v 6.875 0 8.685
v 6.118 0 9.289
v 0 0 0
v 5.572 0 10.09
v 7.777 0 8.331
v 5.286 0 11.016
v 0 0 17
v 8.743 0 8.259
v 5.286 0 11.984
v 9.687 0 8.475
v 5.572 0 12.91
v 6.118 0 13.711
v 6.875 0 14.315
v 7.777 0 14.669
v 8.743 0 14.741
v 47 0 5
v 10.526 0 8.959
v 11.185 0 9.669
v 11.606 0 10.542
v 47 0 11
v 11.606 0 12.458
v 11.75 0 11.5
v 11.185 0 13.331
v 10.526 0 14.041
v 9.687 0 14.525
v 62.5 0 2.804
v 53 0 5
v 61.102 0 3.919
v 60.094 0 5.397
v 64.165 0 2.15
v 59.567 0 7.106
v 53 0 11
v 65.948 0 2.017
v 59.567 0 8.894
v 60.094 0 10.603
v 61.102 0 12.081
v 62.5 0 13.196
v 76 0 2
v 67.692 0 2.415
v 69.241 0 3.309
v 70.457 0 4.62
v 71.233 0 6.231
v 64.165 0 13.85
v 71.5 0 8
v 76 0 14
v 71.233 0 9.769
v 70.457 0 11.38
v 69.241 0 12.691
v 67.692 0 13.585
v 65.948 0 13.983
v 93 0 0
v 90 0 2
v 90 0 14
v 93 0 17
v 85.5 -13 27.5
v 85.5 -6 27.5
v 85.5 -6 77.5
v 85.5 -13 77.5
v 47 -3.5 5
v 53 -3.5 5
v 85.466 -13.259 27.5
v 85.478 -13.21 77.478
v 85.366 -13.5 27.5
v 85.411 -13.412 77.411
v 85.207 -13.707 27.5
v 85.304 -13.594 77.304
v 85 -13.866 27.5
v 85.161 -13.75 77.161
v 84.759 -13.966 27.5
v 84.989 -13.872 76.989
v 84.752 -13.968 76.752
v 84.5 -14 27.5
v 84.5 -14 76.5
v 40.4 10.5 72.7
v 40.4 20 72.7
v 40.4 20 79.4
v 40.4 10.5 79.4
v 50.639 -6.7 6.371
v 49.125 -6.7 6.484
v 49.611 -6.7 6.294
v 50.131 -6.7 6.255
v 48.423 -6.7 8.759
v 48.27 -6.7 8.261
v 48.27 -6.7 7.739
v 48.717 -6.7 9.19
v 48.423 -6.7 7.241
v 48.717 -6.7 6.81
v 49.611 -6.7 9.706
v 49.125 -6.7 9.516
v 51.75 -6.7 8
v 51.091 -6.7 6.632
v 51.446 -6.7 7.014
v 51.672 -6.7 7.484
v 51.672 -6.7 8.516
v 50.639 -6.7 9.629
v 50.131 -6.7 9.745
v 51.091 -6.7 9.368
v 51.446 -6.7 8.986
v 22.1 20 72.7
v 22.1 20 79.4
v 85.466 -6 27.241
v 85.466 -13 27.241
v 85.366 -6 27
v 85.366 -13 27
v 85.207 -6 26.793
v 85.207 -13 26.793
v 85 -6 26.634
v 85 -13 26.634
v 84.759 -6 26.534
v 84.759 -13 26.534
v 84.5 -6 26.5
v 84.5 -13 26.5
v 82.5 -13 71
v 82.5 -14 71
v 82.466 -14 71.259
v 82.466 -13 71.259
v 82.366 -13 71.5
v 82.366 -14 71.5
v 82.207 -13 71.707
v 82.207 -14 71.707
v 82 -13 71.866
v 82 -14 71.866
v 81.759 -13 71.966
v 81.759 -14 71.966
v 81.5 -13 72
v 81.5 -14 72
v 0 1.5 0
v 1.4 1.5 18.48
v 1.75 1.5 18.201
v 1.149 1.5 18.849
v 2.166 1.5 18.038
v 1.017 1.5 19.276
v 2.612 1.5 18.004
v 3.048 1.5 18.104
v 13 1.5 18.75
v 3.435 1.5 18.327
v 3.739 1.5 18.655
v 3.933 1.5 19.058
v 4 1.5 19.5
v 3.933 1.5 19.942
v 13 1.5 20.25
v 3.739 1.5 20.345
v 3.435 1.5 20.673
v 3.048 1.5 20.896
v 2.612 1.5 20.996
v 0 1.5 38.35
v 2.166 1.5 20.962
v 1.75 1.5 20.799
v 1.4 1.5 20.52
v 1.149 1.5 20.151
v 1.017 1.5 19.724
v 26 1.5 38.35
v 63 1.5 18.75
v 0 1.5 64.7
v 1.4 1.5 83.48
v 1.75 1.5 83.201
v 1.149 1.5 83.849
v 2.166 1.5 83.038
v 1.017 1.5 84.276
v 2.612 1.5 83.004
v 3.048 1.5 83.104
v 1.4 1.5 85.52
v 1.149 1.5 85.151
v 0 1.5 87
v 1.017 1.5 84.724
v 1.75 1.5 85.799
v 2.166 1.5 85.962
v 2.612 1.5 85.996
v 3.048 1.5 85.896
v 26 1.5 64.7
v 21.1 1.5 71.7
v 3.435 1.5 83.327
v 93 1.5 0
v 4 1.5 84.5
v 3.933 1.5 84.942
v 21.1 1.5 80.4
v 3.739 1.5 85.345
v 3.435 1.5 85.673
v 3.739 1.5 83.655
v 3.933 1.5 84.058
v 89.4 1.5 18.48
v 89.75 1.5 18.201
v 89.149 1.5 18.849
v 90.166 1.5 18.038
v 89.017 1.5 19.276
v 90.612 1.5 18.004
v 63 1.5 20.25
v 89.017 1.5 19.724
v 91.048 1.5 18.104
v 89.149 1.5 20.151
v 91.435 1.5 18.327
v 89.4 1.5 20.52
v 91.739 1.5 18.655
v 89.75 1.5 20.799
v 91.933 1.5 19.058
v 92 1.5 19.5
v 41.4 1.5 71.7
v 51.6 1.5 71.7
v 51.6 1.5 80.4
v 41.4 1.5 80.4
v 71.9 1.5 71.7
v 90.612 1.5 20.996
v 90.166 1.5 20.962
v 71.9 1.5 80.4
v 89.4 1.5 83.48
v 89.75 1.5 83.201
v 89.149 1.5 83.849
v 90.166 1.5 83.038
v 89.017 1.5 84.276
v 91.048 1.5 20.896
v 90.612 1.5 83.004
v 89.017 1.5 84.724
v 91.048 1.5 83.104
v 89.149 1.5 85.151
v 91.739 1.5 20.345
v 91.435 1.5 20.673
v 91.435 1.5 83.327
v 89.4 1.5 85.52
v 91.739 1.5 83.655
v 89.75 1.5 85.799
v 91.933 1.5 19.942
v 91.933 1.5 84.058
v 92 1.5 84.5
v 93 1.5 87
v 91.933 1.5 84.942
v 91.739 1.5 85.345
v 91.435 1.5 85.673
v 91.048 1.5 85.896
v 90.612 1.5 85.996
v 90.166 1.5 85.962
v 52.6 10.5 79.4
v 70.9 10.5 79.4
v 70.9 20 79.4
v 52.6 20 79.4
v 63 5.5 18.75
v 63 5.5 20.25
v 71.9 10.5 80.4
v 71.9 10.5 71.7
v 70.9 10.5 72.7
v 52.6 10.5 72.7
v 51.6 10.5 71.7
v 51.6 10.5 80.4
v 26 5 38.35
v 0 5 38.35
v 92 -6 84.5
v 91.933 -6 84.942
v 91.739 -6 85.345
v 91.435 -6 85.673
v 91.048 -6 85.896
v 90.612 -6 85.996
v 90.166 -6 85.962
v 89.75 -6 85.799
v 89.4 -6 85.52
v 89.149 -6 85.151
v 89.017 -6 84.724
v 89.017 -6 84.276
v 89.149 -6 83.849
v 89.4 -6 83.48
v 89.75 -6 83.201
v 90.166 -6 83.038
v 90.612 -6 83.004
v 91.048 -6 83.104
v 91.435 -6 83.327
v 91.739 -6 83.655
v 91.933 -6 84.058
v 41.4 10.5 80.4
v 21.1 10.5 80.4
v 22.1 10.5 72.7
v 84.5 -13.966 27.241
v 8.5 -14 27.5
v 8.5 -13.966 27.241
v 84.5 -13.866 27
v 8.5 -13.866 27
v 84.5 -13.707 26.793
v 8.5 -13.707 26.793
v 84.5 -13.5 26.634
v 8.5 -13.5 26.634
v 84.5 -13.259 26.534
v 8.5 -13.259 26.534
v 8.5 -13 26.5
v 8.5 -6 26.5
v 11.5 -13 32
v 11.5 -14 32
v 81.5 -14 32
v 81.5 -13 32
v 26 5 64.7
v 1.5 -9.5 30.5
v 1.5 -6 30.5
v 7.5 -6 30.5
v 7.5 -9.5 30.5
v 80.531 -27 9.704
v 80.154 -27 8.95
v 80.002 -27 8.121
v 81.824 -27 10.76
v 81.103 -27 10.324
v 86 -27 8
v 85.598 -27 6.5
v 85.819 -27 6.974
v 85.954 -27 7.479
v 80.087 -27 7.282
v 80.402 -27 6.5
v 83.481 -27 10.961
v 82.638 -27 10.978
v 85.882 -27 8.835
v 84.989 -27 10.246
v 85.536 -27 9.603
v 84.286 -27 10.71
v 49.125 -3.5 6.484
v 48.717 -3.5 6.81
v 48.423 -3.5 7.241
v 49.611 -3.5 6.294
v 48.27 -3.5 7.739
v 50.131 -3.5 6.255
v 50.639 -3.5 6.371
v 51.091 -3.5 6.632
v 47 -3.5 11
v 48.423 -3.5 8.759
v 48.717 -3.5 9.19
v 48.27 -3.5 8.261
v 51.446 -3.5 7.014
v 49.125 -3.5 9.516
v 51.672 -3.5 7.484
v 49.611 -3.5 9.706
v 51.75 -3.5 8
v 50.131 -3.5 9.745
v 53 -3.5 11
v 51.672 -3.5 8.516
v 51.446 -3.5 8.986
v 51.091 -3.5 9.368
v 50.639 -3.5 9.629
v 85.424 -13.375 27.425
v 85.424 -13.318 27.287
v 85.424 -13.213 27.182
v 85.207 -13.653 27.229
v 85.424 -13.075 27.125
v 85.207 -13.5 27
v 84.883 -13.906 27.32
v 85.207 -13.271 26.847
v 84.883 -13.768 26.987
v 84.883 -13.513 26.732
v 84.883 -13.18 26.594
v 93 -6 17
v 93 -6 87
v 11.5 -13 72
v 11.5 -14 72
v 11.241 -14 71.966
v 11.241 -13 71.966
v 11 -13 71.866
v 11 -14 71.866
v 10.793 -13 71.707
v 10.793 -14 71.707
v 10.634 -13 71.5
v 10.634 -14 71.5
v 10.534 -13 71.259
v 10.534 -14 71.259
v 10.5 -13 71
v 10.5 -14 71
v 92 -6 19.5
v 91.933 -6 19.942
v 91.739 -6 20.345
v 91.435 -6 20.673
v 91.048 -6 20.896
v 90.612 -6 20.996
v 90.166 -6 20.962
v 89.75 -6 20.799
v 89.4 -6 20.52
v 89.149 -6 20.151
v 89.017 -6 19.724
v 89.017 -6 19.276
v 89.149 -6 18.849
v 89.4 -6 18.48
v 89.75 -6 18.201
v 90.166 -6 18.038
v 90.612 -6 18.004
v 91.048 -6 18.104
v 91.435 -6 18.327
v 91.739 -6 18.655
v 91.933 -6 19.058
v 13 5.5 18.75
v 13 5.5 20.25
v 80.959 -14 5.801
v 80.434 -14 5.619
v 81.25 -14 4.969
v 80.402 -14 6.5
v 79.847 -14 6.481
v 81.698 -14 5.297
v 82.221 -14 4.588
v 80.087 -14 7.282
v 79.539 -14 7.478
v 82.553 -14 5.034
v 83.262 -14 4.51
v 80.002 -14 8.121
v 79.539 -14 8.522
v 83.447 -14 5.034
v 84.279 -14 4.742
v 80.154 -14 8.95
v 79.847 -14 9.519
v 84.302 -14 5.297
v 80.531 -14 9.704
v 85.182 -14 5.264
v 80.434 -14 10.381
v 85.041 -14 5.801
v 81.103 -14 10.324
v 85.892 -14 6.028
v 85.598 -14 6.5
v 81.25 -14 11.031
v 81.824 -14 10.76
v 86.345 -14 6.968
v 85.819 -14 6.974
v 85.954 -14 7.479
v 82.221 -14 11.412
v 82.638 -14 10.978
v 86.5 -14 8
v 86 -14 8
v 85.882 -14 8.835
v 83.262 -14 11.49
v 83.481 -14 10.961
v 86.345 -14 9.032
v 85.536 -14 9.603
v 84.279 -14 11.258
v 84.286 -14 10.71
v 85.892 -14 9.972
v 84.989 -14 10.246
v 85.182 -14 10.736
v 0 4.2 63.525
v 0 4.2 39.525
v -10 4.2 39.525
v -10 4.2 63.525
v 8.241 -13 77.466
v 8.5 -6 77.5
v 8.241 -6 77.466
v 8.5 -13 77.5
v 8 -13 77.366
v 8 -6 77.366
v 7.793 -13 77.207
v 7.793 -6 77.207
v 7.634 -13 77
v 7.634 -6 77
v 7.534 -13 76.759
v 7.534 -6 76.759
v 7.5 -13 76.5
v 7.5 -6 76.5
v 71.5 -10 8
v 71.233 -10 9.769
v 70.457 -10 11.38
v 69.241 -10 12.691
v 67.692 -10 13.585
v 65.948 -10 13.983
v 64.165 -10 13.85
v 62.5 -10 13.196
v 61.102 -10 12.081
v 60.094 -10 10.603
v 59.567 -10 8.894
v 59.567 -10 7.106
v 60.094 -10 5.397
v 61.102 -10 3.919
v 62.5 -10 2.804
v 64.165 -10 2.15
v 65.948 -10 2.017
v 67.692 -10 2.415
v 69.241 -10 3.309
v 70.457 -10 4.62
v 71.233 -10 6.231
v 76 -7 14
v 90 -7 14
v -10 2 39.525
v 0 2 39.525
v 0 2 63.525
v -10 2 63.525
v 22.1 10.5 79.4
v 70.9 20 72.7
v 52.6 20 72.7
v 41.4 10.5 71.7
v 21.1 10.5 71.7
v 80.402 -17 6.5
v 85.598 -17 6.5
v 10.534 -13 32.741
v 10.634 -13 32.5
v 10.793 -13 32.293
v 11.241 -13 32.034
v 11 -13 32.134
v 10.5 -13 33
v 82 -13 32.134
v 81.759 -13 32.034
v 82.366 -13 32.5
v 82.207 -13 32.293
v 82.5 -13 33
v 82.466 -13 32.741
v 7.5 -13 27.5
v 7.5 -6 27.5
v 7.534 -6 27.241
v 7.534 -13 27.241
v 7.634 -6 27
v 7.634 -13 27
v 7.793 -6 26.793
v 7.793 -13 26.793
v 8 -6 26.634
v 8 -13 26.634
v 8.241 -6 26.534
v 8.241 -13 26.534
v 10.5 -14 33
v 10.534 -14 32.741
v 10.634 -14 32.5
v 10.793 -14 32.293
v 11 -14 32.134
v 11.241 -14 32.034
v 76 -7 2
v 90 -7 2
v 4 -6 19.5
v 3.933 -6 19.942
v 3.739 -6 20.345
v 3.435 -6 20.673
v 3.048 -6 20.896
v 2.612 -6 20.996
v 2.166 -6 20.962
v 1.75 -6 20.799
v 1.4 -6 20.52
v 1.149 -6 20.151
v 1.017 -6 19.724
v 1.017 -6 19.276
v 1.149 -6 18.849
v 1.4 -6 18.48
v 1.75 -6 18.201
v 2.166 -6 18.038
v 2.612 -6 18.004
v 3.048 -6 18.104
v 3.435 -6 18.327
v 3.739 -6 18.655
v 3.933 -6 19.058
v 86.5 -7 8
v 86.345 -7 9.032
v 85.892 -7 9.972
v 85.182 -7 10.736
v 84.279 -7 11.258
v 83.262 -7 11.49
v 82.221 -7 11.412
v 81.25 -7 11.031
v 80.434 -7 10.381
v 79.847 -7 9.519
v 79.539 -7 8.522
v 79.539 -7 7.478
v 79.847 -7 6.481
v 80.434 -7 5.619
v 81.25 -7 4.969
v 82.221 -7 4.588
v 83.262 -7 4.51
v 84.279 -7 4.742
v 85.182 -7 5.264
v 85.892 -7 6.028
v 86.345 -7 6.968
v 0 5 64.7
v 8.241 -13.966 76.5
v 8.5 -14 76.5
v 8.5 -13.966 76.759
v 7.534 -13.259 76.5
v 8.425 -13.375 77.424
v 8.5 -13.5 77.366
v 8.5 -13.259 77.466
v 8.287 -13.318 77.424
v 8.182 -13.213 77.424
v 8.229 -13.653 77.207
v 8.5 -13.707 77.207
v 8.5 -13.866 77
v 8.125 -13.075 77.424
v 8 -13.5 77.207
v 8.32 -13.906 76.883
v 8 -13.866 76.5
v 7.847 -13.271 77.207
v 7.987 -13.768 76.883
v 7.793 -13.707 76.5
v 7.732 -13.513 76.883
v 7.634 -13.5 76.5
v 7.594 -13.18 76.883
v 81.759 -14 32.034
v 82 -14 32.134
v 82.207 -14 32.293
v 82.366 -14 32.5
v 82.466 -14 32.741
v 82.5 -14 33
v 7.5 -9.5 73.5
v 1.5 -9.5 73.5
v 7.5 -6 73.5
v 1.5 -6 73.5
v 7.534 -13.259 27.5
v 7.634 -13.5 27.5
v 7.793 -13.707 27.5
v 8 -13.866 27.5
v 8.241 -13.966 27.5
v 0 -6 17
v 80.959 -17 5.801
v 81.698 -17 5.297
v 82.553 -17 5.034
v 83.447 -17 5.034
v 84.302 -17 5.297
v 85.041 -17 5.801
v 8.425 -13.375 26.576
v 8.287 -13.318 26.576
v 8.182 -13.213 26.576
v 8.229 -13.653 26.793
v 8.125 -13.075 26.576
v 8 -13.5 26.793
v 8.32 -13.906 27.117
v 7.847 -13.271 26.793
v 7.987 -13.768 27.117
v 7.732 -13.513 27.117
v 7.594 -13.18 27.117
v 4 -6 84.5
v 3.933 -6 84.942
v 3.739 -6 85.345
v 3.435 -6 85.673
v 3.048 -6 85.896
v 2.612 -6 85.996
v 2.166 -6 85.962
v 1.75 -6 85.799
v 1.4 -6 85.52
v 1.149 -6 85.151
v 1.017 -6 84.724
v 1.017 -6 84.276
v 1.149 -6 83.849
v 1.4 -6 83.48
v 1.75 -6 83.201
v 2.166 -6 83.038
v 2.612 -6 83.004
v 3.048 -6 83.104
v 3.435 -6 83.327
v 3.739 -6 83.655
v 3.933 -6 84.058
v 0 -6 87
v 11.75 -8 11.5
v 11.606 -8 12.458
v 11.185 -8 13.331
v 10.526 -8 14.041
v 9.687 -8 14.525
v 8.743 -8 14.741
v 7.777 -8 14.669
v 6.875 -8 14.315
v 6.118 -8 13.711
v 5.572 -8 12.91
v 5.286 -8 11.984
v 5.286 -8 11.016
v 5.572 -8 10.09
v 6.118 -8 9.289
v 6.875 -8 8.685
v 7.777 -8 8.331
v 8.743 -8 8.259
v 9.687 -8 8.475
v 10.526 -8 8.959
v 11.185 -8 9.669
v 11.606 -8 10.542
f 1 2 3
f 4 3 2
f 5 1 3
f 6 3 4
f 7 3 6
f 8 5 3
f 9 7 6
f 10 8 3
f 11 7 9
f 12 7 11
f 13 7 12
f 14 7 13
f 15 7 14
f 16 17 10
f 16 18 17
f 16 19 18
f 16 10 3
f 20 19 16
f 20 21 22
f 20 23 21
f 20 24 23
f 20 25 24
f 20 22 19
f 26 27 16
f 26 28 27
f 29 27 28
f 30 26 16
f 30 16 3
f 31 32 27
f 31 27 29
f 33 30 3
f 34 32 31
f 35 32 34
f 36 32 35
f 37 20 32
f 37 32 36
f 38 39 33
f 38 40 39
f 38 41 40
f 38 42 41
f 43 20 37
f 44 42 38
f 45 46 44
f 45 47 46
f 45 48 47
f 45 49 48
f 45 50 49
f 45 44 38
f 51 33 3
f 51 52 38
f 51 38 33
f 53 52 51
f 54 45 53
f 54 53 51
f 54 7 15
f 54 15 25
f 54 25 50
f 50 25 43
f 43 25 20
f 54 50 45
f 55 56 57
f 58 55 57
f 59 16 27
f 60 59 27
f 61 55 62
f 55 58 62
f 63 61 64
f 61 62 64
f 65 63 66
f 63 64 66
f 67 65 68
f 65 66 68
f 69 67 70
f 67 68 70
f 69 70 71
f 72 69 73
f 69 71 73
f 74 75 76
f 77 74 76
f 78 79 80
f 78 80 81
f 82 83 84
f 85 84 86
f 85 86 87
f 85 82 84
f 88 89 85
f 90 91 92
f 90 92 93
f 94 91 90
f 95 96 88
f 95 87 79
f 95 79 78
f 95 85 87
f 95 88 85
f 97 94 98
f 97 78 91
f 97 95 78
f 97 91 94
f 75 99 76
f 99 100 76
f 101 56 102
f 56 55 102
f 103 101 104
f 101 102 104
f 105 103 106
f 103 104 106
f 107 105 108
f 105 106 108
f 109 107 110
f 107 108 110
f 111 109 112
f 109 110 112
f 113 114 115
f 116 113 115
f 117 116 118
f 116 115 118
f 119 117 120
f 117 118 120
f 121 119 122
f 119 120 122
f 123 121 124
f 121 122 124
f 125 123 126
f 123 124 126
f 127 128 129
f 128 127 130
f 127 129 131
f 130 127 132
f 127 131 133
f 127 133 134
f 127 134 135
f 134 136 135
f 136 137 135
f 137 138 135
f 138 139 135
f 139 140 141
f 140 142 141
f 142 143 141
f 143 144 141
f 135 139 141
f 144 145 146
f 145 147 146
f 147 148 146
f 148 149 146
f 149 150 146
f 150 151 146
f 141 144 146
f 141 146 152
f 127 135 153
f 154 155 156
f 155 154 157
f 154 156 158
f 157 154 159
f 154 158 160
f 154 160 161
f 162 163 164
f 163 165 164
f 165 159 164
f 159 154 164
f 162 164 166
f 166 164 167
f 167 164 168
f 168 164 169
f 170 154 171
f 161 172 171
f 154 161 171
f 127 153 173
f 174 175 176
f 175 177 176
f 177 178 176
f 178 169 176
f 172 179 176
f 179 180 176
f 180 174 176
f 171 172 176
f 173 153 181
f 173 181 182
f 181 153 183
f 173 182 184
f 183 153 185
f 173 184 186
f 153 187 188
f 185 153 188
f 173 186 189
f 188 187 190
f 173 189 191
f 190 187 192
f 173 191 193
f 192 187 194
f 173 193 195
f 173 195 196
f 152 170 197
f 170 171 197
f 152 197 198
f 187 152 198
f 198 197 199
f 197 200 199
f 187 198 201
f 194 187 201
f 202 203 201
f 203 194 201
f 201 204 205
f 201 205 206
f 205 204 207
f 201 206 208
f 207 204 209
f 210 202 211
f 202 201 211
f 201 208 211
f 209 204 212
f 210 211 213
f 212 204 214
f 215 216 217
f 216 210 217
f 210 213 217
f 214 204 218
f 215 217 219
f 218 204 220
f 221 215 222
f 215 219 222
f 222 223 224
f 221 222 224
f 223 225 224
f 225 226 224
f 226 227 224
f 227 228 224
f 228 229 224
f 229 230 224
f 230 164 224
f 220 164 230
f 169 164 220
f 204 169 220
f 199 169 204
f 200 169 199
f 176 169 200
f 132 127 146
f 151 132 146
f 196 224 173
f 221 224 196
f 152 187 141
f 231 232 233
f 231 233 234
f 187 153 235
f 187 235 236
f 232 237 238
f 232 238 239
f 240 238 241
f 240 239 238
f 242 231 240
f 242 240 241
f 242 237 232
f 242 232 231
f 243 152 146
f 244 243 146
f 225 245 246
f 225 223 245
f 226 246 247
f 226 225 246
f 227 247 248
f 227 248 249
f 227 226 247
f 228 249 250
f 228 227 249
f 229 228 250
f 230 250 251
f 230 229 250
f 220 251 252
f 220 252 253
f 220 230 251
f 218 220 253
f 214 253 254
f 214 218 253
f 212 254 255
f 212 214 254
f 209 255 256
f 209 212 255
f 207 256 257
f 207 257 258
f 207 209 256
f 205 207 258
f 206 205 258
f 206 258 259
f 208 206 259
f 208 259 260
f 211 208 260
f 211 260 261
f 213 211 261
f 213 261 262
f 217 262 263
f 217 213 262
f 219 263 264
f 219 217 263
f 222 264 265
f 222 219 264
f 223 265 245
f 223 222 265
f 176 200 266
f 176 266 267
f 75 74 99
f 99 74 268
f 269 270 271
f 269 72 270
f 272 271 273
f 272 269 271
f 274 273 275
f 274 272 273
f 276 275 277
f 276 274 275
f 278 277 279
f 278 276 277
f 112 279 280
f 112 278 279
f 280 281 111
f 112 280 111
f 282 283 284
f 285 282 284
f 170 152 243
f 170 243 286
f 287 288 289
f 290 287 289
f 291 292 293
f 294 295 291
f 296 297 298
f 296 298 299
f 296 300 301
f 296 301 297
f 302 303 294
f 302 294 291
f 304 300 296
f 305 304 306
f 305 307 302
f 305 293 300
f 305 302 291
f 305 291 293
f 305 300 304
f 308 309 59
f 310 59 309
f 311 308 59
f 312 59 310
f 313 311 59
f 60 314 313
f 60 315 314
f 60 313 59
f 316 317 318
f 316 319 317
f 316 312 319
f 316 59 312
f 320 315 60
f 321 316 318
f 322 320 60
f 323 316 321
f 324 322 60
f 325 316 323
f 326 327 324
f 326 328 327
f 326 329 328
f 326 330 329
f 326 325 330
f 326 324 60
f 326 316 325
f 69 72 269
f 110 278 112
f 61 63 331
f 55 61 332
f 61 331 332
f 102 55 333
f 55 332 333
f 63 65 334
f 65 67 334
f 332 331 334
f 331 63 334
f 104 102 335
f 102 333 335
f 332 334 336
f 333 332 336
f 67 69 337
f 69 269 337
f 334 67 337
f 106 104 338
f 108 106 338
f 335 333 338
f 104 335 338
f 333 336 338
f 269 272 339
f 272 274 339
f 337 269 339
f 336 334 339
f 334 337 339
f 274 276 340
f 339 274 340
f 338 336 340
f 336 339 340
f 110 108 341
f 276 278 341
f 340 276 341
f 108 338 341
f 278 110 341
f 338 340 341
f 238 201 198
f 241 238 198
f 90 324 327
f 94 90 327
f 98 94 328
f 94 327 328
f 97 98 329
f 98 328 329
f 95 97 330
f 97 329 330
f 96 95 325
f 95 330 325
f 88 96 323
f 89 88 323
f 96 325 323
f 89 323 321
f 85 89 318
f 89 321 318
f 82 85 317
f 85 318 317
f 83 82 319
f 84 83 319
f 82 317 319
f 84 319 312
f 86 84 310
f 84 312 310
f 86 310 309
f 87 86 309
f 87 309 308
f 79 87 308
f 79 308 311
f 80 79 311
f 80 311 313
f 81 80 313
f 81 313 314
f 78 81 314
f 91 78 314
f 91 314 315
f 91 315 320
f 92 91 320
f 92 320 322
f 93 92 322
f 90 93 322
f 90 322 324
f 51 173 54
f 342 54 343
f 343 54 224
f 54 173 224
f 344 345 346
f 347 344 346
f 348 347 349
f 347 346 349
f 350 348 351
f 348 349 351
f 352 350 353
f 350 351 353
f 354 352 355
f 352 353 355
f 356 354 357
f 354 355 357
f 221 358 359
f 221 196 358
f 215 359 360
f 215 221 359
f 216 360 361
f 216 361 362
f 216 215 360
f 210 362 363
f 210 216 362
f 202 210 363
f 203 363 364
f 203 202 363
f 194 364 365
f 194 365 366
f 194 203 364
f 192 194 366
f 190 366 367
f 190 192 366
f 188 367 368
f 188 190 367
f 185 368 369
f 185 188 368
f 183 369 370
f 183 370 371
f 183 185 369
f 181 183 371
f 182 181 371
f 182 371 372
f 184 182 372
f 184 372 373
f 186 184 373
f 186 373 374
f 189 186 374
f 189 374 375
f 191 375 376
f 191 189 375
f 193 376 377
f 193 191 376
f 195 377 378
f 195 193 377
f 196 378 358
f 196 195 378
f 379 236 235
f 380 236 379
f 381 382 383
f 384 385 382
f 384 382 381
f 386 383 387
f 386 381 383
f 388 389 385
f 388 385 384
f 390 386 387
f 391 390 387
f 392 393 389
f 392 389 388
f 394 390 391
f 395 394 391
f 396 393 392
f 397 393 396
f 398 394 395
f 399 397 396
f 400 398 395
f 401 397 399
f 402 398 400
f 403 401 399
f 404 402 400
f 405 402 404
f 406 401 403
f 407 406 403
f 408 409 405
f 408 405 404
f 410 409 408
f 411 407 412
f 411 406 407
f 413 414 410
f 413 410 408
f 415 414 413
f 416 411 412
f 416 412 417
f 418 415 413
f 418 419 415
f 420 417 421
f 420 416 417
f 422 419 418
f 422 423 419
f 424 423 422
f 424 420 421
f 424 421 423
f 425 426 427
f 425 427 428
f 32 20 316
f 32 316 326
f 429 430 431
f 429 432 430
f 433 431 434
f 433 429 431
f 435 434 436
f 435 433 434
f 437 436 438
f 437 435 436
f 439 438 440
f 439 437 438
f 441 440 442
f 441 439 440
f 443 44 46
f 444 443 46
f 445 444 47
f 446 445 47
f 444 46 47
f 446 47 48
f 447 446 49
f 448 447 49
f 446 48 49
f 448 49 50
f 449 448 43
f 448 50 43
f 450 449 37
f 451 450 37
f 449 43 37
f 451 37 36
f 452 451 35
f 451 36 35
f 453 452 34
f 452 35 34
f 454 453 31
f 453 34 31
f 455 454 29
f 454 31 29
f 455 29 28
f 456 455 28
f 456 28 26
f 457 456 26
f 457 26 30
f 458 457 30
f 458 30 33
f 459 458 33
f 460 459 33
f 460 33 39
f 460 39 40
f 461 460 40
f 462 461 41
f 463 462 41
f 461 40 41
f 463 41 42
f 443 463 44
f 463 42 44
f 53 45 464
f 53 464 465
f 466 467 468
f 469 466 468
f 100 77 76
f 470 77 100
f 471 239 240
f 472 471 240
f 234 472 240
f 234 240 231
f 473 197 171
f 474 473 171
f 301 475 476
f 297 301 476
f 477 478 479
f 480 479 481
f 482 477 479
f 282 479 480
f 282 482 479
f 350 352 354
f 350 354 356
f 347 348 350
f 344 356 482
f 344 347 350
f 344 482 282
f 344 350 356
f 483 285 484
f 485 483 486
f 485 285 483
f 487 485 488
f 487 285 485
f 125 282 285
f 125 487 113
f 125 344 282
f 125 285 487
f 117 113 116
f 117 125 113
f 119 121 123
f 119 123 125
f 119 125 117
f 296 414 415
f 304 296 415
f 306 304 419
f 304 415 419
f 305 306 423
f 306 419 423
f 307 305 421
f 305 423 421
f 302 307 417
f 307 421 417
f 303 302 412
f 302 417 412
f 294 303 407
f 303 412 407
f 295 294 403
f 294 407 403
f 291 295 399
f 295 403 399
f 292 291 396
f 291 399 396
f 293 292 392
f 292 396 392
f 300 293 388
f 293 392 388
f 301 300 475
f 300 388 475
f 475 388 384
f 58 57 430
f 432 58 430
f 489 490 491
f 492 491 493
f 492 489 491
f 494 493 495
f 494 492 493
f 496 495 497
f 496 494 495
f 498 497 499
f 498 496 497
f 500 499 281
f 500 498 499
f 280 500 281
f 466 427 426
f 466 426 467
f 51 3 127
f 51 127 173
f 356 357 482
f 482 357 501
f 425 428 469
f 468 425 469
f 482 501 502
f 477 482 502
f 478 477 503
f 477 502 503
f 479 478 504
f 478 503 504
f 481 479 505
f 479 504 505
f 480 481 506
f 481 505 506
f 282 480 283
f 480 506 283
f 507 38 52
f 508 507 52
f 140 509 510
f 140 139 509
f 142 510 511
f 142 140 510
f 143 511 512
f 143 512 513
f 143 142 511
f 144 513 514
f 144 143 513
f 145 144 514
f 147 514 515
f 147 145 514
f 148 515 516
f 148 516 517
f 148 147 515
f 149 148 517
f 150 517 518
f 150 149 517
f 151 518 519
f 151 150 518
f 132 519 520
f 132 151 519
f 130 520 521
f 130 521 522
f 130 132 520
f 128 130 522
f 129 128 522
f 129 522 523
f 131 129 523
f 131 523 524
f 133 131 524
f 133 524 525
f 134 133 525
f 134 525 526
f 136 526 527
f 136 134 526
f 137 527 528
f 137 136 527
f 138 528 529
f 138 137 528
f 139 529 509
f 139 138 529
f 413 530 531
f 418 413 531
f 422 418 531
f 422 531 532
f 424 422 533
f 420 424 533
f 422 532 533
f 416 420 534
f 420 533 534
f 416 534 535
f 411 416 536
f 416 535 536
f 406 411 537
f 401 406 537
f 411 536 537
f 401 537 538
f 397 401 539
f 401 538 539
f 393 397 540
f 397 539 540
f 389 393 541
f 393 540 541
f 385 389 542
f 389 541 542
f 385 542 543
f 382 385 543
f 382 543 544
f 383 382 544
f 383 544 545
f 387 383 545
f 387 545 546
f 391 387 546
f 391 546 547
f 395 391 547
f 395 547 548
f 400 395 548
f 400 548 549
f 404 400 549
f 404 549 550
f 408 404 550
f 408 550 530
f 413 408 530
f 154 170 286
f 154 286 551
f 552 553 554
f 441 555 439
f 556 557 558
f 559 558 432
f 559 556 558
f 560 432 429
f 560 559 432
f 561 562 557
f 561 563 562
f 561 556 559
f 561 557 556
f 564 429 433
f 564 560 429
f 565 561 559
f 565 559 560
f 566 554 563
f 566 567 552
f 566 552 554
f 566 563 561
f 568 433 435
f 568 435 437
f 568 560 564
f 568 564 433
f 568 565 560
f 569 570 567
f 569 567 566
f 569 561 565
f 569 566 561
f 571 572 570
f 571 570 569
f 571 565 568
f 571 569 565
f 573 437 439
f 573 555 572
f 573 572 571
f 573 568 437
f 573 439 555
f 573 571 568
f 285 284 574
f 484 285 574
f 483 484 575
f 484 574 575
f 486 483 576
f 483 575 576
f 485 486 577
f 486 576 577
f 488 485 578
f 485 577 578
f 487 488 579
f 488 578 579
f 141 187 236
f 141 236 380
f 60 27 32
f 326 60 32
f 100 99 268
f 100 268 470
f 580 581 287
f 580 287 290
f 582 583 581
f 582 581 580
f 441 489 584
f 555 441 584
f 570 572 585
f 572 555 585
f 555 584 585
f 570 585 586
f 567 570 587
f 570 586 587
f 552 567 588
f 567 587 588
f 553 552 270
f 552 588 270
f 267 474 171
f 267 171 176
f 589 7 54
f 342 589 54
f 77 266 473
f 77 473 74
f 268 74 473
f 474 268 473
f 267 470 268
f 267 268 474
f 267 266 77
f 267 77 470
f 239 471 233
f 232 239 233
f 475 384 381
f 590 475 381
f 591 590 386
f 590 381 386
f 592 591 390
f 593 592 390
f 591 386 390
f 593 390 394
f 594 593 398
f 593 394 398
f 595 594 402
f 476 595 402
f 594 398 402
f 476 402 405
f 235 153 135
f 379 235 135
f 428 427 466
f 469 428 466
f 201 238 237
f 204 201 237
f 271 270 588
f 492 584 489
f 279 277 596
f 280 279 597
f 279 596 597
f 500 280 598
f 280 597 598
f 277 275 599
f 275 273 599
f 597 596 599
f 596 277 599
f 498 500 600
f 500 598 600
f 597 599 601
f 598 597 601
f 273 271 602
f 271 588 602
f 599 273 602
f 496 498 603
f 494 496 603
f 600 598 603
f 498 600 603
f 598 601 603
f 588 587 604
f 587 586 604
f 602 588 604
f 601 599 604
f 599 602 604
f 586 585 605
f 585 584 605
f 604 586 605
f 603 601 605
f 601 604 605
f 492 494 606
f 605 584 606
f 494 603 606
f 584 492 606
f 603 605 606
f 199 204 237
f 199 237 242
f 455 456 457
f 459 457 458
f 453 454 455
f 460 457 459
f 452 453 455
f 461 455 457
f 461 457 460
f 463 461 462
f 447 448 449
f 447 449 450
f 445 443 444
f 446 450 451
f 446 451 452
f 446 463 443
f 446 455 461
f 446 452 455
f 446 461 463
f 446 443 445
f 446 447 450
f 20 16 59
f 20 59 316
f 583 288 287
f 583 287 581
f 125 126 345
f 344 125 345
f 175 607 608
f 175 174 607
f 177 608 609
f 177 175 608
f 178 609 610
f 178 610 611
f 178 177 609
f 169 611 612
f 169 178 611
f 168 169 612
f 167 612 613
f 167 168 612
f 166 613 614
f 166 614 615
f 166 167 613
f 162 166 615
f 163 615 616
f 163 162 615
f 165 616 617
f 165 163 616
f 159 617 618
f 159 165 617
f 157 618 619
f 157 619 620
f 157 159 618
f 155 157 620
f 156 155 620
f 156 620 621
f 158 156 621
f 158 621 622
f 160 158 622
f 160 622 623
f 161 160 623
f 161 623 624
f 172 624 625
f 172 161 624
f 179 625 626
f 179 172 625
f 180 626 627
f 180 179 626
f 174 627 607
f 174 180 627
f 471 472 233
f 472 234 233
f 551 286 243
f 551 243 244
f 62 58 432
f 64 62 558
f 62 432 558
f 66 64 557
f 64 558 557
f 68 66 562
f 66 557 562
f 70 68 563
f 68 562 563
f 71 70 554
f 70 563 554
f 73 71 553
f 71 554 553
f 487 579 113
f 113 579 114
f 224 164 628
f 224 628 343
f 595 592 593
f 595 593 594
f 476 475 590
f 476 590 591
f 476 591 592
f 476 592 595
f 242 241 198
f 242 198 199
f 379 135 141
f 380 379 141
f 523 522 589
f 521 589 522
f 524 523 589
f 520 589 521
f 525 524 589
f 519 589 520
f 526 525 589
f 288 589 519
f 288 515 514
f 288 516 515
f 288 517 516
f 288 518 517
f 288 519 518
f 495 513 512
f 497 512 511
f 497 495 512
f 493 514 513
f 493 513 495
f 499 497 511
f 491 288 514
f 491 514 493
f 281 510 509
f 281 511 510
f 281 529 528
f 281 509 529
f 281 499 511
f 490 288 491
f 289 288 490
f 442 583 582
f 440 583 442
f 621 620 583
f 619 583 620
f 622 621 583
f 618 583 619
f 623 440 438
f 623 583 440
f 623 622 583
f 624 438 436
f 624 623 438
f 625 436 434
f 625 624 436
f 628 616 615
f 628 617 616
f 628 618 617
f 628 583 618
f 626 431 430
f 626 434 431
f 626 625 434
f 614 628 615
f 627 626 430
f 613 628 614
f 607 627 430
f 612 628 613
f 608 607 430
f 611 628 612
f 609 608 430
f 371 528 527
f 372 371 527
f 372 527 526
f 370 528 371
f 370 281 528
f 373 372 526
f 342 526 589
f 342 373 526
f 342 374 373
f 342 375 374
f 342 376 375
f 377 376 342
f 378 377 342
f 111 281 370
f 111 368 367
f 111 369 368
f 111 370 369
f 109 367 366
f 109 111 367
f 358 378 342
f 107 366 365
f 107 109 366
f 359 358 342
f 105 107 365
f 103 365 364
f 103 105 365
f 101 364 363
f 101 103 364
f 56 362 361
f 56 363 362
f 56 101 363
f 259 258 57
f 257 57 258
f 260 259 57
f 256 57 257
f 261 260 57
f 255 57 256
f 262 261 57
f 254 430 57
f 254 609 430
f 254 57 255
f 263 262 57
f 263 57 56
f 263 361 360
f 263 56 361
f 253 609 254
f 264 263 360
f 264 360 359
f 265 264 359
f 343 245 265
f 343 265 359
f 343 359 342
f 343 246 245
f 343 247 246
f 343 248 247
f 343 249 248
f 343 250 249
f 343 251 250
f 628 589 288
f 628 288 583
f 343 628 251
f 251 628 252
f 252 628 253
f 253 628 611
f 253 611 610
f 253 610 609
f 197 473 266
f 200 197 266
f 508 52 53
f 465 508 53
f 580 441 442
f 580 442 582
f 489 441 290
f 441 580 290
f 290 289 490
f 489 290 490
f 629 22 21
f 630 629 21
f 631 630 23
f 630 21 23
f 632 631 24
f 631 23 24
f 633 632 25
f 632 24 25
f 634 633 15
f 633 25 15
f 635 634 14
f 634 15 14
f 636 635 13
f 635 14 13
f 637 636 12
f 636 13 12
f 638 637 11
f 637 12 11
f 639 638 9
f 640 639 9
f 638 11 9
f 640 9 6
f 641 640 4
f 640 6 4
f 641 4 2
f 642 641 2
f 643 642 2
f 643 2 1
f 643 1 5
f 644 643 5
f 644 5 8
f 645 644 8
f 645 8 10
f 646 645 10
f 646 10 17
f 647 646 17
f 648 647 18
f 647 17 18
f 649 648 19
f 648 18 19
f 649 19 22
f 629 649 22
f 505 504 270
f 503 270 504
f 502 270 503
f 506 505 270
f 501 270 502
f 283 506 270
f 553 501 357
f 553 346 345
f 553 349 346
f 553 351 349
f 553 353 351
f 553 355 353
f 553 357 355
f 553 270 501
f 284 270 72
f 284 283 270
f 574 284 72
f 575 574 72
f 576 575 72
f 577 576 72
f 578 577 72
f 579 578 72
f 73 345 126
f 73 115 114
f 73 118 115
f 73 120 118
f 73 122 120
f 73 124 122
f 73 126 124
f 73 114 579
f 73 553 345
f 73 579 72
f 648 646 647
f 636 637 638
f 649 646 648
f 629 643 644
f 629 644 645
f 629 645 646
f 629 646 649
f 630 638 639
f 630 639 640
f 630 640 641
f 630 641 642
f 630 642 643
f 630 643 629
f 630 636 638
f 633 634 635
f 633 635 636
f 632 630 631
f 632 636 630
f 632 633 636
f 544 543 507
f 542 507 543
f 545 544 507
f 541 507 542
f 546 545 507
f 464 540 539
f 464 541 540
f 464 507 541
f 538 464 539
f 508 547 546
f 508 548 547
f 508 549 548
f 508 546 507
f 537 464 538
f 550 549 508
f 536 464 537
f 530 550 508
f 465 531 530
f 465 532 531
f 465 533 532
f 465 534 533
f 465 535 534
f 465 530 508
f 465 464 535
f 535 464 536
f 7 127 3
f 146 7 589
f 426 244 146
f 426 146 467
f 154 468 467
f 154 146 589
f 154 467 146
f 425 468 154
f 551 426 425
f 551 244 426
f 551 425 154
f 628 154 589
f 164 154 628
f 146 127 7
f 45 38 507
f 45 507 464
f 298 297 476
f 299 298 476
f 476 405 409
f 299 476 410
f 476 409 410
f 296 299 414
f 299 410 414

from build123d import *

# Parameters (mm, degrees)
F0_W      = 93
F0_H      = 70
F0_R      = 1.5
F0_H_2    = 17
F0_R_2    = 3.25
F0_W_2    = 6
F0_H_3    = 6
F0_R_3    = 6
F0_W_3    = 14
F0_H_4    = 12
F0_R_4    = 3.5
F0_R_5    = 1.75
F1_DEPTH  = 1.5
F2_W      = 20.3
F2_H      = 8.7
F2_W_2    = 18.3
F2_H_2    = 6.7
F3_DEPTH  = 9
F2_W_3    = 26
F2_H_3    = 26.35
F4_DEPTH  = 3.5
F5_DEPTH  = 18.5
F6_DEPTH  = 6
F2_W_4    = 50
F2_H_4    = 1.5
F7_DEPTH  = 4
F8_DEPTH  = 10
F9_DEPTH  = 3.5
F10_DEPTH = 6.7
F11_DEPTH = 27
F12_DEPTH = 17
F13_DEPTH = 14
F14_DEPTH = 7
F15_DEPTH = 8
F16_W     = 6
F16_H     = 43
F17_DEPTH = 3.5
F18_DEPTH = 8
F19_R     = 1
F21_DEPTH = 1
F22_W     = 2.2
F22_H     = 24
F23_DEPTH = 10


with BuildPart() as f1:
    # F0 (on Front) → F1 (new body)
    with BuildSketch(Plane.XZ):
        with Locations((46.5, 52)):
            Rectangle(F0_W, F0_H)
        with Locations((2.5, 19.5)):
            Circle(F0_R, mode=Mode.SUBTRACT)
        with Locations((90.5, 19.5)):
            Circle(F0_R, mode=Mode.SUBTRACT)
        with Locations((2.5, 84.5)):
            Circle(F0_R, mode=Mode.SUBTRACT)
        with Locations((90.5, 84.5)):
            Circle(F0_R, mode=Mode.SUBTRACT)
        with Locations((46.5, 8.5)):
            Rectangle(F0_W, F0_H_2)
        with Locations((8.5, 11.5)):
            Circle(F0_R_2, mode=Mode.SUBTRACT)
        with Locations((50, 8)):
            Rectangle(F0_W_2, F0_H_3, mode=Mode.SUBTRACT)
        with Locations((65.5, 8)):
            Circle(F0_R_3, mode=Mode.SUBTRACT)
        with Locations((83, 8)):
            Rectangle(F0_W_3, F0_H_4, mode=Mode.SUBTRACT)
        with Locations((83, 8)):
            Rectangle(F0_W_3, F0_H_4)
        with Locations((83, 8)):
            Circle(F0_R_4, mode=Mode.SUBTRACT)
        with Locations((65.5, 8)):
            Circle(F0_R_3)
        with Locations((83, 8)):
            Circle(F0_R_4)
        with BuildLine():
            ThreePointArc((80.4019237886, 6.5), (82.2235428647, 10.8977774789), (86, 8))
            ThreePointArc((86, 8), (85.8977774789, 7.2235428647), (85.5980762114, 6.5))
            ThreePointArc((85.5980762114, 6.5), (83, 5), (80.4019237886, 6.5))
        make_face(mode=Mode.SUBTRACT)
        with Locations((50, 8)):
            Rectangle(F0_W_2, F0_H_3)
        with Locations((50, 8)):
            Circle(F0_R_5, mode=Mode.SUBTRACT)
        with Locations((8.5, 11.5)):
            Circle(F0_R_2)
        with BuildLine():
            ThreePointArc((85.5980762114, 6.5), (85.8977774789, 7.2235428647), (86, 8))
            ThreePointArc((86, 8), (82.2235428647, 10.8977774789), (80.4019237886, 6.5))
            Line((80.4019237886, 6.5), (85.5980762114, 6.5))
        make_face()
        with Locations((50, 8)):
            Circle(F0_R_5)
        with BuildLine():
            Line((85.5980762114, 6.5), (80.4019237886, 6.5))
            ThreePointArc((80.4019237886, 6.5), (83, 5), (85.5980762114, 6.5))
        make_face()
    extrude(amount=-F1_DEPTH)

    # F2 (on face) → F3 (join)
    with BuildSketch(Plane(origin=(0, 1.5, 0), x_dir=(-1, 0, 0), z_dir=(0, 1, 0))):
        with Locations((-61.75, 76.05)):
            Rectangle(F2_W, F2_H)
        with Locations((-61.75, 76.05)):
            Rectangle(F2_W_2, F2_H_2, mode=Mode.SUBTRACT)
        with Locations((-31.25, 76.05)):
            Rectangle(F2_W, F2_H)
        with Locations((-31.25, 76.05)):
            Rectangle(F2_W_2, F2_H_2, mode=Mode.SUBTRACT)
    extrude(amount=F3_DEPTH)

    # F2 (on face) → F4 (join)
    with BuildSketch(Plane(origin=(0, 1.5, 0), x_dir=(-1, 0, 0), z_dir=(0, 1, 0))):
        with Locations((-13, 51.525)):
            Rectangle(F2_W_3, F2_H_3)
    extrude(amount=F4_DEPTH)

    # F5 (add): faces of the model
    f5_faces = [f1.faces().sort_by_distance(p)[0] for p in [
        (61.75, 1.5, 76.05),
        (31.25, 1.5, 76.05),
    ]]
    extrude(f5_faces, amount=F5_DEPTH)

    # F0 (on Front) → F6 (join)
    with BuildSketch(Plane.XZ):
        with Locations((46.5, 52)):
            Rectangle(F0_W, F0_H)
        with Locations((2.5, 19.5)):
            Circle(F0_R, mode=Mode.SUBTRACT)
        with Locations((90.5, 19.5)):
            Circle(F0_R, mode=Mode.SUBTRACT)
        with Locations((2.5, 84.5)):
            Circle(F0_R, mode=Mode.SUBTRACT)
        with Locations((90.5, 84.5)):
            Circle(F0_R, mode=Mode.SUBTRACT)
    extrude(amount=F6_DEPTH)

    # F2 (on face) → F7 (join)
    with BuildSketch(Plane(origin=(0, 1.5, 0), x_dir=(-1, 0, 0), z_dir=(0, 1, 0))):
        with Locations((-38, 19.5)):
            Rectangle(F2_W_4, F2_H_4)
    extrude(amount=F7_DEPTH)

    # F0 (on Front) → F8 (join)
    with BuildSketch(Plane.XZ):
        with Locations((65.5, 8)):
            Circle(F0_R_3)
    extrude(amount=F8_DEPTH)

    # F0 (on Front) → F9 (join)
    with BuildSketch(Plane.XZ):
        with Locations((50, 8)):
            Rectangle(F0_W_2, F0_H_3)
        with Locations((50, 8)):
            Circle(F0_R_5, mode=Mode.SUBTRACT)
    extrude(amount=F9_DEPTH)

    # F0 (on Front) → F10 (join)
    with BuildSketch(Plane.XZ):
        with Locations((50, 8)):
            Circle(F0_R_5)
    extrude(amount=F10_DEPTH)

    # F0 (on Front) → F11 (join)
    with BuildSketch(Plane.XZ):
        with BuildLine():
            ThreePointArc((85.5980762114, 6.5), (85.8977774789, 7.2235428647), (86, 8))
            ThreePointArc((86, 8), (82.2235428647, 10.8977774789), (80.4019237886, 6.5))
            Line((80.4019237886, 6.5), (85.5980762114, 6.5))
        make_face()
    extrude(amount=F11_DEPTH)

    # F0 (on Front) → F12 (join)
    with BuildSketch(Plane.XZ):
        with BuildLine():
            Line((85.5980762114, 6.5), (80.4019237886, 6.5))
            ThreePointArc((80.4019237886, 6.5), (83, 5), (85.5980762114, 6.5))
        make_face()
    extrude(amount=F12_DEPTH)

    # F0 (on Front) → F13 (join)
    with BuildSketch(Plane.XZ):
        with Locations((83, 8)):
            Circle(F0_R_4)
        with BuildLine():
            ThreePointArc((80.4019237886, 6.5), (82.2235428647, 10.8977774789), (86, 8))
            ThreePointArc((86, 8), (85.8977774789, 7.2235428647), (85.5980762114, 6.5))
            ThreePointArc((85.5980762114, 6.5), (83, 5), (80.4019237886, 6.5))
        make_face(mode=Mode.SUBTRACT)
        with BuildLine():
            Line((85.5980762114, 6.5), (80.4019237886, 6.5))
            ThreePointArc((80.4019237886, 6.5), (83, 5), (85.5980762114, 6.5))
        make_face()
        with BuildLine():
            ThreePointArc((85.5980762114, 6.5), (85.8977774789, 7.2235428647), (86, 8))
            ThreePointArc((86, 8), (82.2235428647, 10.8977774789), (80.4019237886, 6.5))
            Line((80.4019237886, 6.5), (85.5980762114, 6.5))
        make_face()
    extrude(amount=F13_DEPTH)

    # F0 (on Front) → F14 (join)
    with BuildSketch(Plane.XZ):
        with Locations((83, 8)):
            Rectangle(F0_W_3, F0_H_4)
        with Locations((83, 8)):
            Circle(F0_R_4, mode=Mode.SUBTRACT)
    extrude(amount=F14_DEPTH)

    # F0 (on Front) → F15 (join)
    with BuildSketch(Plane.XZ):
        with Locations((8.5, 11.5)):
            Circle(F0_R_2)
    extrude(amount=F15_DEPTH)

    # F16 (on face) → F17 (join)
    with BuildSketch(Plane.XZ.offset(6)):
        with Locations((4.5, 52)):
            Rectangle(F16_W, F16_H)
    extrude(amount=F17_DEPTH)

    # F16 (on face) → F18 (join)
    with BuildSketch(Plane.XZ.offset(6)):
        Polygon((85.5, 77.5), (7.5, 77.5), (7.5, 73.5), (7.5, 30.5), (7.5, 26.5), (85.5, 26.5), align=None)
    extrude(amount=F18_DEPTH)

    # F19
    f19_edges = [f1.edges().sort_by_distance(p)[0] for p in [
        (7.5, -14, 52),
        (46.5, -14, 77.5),
        (46.5, -14, 26.5),
        (85.5, -14, 52),
        (7.5, -10, 26.5),
        (85.5, -10, 26.5),
        (7.5, -10, 77.5),
    ]]
    fillet(f19_edges, radius=F19_R)

    # F20 (on face) → F21 (cut)
    with BuildSketch(Plane.XZ.offset(14)):
        with BuildLine():
            Line((81.5, 72), (11.5, 72))
            ThreePointArc((11.5, 72), (10.7928932188, 71.7071067812), (10.5, 71))
            Line((10.5, 71), (10.5, 33))
            ThreePointArc((10.5, 33), (10.7928932188, 32.2928932188), (11.5, 32))
            Line((11.5, 32), (81.5, 32))
            ThreePointArc((81.5, 32), (82.2071067812, 32.2928932188), (82.5, 33))
            Line((82.5, 33), (82.5, 71))
            ThreePointArc((82.5, 71), (82.2071067812, 71.7071067812), (81.5, 72))
        make_face()
    extrude(amount=-F21_DEPTH, mode=Mode.SUBTRACT)

    # F22 (on face) → F23 (join)
    with BuildSketch(Plane(origin=(0, 0, 0), x_dir=(0, -1, 0), z_dir=(-1, 0, 0))):
        with Locations((-3.1, 51.525)):
            Rectangle(F22_W, F22_H)
    extrude(amount=F23_DEPTH)


solid = f1.part
